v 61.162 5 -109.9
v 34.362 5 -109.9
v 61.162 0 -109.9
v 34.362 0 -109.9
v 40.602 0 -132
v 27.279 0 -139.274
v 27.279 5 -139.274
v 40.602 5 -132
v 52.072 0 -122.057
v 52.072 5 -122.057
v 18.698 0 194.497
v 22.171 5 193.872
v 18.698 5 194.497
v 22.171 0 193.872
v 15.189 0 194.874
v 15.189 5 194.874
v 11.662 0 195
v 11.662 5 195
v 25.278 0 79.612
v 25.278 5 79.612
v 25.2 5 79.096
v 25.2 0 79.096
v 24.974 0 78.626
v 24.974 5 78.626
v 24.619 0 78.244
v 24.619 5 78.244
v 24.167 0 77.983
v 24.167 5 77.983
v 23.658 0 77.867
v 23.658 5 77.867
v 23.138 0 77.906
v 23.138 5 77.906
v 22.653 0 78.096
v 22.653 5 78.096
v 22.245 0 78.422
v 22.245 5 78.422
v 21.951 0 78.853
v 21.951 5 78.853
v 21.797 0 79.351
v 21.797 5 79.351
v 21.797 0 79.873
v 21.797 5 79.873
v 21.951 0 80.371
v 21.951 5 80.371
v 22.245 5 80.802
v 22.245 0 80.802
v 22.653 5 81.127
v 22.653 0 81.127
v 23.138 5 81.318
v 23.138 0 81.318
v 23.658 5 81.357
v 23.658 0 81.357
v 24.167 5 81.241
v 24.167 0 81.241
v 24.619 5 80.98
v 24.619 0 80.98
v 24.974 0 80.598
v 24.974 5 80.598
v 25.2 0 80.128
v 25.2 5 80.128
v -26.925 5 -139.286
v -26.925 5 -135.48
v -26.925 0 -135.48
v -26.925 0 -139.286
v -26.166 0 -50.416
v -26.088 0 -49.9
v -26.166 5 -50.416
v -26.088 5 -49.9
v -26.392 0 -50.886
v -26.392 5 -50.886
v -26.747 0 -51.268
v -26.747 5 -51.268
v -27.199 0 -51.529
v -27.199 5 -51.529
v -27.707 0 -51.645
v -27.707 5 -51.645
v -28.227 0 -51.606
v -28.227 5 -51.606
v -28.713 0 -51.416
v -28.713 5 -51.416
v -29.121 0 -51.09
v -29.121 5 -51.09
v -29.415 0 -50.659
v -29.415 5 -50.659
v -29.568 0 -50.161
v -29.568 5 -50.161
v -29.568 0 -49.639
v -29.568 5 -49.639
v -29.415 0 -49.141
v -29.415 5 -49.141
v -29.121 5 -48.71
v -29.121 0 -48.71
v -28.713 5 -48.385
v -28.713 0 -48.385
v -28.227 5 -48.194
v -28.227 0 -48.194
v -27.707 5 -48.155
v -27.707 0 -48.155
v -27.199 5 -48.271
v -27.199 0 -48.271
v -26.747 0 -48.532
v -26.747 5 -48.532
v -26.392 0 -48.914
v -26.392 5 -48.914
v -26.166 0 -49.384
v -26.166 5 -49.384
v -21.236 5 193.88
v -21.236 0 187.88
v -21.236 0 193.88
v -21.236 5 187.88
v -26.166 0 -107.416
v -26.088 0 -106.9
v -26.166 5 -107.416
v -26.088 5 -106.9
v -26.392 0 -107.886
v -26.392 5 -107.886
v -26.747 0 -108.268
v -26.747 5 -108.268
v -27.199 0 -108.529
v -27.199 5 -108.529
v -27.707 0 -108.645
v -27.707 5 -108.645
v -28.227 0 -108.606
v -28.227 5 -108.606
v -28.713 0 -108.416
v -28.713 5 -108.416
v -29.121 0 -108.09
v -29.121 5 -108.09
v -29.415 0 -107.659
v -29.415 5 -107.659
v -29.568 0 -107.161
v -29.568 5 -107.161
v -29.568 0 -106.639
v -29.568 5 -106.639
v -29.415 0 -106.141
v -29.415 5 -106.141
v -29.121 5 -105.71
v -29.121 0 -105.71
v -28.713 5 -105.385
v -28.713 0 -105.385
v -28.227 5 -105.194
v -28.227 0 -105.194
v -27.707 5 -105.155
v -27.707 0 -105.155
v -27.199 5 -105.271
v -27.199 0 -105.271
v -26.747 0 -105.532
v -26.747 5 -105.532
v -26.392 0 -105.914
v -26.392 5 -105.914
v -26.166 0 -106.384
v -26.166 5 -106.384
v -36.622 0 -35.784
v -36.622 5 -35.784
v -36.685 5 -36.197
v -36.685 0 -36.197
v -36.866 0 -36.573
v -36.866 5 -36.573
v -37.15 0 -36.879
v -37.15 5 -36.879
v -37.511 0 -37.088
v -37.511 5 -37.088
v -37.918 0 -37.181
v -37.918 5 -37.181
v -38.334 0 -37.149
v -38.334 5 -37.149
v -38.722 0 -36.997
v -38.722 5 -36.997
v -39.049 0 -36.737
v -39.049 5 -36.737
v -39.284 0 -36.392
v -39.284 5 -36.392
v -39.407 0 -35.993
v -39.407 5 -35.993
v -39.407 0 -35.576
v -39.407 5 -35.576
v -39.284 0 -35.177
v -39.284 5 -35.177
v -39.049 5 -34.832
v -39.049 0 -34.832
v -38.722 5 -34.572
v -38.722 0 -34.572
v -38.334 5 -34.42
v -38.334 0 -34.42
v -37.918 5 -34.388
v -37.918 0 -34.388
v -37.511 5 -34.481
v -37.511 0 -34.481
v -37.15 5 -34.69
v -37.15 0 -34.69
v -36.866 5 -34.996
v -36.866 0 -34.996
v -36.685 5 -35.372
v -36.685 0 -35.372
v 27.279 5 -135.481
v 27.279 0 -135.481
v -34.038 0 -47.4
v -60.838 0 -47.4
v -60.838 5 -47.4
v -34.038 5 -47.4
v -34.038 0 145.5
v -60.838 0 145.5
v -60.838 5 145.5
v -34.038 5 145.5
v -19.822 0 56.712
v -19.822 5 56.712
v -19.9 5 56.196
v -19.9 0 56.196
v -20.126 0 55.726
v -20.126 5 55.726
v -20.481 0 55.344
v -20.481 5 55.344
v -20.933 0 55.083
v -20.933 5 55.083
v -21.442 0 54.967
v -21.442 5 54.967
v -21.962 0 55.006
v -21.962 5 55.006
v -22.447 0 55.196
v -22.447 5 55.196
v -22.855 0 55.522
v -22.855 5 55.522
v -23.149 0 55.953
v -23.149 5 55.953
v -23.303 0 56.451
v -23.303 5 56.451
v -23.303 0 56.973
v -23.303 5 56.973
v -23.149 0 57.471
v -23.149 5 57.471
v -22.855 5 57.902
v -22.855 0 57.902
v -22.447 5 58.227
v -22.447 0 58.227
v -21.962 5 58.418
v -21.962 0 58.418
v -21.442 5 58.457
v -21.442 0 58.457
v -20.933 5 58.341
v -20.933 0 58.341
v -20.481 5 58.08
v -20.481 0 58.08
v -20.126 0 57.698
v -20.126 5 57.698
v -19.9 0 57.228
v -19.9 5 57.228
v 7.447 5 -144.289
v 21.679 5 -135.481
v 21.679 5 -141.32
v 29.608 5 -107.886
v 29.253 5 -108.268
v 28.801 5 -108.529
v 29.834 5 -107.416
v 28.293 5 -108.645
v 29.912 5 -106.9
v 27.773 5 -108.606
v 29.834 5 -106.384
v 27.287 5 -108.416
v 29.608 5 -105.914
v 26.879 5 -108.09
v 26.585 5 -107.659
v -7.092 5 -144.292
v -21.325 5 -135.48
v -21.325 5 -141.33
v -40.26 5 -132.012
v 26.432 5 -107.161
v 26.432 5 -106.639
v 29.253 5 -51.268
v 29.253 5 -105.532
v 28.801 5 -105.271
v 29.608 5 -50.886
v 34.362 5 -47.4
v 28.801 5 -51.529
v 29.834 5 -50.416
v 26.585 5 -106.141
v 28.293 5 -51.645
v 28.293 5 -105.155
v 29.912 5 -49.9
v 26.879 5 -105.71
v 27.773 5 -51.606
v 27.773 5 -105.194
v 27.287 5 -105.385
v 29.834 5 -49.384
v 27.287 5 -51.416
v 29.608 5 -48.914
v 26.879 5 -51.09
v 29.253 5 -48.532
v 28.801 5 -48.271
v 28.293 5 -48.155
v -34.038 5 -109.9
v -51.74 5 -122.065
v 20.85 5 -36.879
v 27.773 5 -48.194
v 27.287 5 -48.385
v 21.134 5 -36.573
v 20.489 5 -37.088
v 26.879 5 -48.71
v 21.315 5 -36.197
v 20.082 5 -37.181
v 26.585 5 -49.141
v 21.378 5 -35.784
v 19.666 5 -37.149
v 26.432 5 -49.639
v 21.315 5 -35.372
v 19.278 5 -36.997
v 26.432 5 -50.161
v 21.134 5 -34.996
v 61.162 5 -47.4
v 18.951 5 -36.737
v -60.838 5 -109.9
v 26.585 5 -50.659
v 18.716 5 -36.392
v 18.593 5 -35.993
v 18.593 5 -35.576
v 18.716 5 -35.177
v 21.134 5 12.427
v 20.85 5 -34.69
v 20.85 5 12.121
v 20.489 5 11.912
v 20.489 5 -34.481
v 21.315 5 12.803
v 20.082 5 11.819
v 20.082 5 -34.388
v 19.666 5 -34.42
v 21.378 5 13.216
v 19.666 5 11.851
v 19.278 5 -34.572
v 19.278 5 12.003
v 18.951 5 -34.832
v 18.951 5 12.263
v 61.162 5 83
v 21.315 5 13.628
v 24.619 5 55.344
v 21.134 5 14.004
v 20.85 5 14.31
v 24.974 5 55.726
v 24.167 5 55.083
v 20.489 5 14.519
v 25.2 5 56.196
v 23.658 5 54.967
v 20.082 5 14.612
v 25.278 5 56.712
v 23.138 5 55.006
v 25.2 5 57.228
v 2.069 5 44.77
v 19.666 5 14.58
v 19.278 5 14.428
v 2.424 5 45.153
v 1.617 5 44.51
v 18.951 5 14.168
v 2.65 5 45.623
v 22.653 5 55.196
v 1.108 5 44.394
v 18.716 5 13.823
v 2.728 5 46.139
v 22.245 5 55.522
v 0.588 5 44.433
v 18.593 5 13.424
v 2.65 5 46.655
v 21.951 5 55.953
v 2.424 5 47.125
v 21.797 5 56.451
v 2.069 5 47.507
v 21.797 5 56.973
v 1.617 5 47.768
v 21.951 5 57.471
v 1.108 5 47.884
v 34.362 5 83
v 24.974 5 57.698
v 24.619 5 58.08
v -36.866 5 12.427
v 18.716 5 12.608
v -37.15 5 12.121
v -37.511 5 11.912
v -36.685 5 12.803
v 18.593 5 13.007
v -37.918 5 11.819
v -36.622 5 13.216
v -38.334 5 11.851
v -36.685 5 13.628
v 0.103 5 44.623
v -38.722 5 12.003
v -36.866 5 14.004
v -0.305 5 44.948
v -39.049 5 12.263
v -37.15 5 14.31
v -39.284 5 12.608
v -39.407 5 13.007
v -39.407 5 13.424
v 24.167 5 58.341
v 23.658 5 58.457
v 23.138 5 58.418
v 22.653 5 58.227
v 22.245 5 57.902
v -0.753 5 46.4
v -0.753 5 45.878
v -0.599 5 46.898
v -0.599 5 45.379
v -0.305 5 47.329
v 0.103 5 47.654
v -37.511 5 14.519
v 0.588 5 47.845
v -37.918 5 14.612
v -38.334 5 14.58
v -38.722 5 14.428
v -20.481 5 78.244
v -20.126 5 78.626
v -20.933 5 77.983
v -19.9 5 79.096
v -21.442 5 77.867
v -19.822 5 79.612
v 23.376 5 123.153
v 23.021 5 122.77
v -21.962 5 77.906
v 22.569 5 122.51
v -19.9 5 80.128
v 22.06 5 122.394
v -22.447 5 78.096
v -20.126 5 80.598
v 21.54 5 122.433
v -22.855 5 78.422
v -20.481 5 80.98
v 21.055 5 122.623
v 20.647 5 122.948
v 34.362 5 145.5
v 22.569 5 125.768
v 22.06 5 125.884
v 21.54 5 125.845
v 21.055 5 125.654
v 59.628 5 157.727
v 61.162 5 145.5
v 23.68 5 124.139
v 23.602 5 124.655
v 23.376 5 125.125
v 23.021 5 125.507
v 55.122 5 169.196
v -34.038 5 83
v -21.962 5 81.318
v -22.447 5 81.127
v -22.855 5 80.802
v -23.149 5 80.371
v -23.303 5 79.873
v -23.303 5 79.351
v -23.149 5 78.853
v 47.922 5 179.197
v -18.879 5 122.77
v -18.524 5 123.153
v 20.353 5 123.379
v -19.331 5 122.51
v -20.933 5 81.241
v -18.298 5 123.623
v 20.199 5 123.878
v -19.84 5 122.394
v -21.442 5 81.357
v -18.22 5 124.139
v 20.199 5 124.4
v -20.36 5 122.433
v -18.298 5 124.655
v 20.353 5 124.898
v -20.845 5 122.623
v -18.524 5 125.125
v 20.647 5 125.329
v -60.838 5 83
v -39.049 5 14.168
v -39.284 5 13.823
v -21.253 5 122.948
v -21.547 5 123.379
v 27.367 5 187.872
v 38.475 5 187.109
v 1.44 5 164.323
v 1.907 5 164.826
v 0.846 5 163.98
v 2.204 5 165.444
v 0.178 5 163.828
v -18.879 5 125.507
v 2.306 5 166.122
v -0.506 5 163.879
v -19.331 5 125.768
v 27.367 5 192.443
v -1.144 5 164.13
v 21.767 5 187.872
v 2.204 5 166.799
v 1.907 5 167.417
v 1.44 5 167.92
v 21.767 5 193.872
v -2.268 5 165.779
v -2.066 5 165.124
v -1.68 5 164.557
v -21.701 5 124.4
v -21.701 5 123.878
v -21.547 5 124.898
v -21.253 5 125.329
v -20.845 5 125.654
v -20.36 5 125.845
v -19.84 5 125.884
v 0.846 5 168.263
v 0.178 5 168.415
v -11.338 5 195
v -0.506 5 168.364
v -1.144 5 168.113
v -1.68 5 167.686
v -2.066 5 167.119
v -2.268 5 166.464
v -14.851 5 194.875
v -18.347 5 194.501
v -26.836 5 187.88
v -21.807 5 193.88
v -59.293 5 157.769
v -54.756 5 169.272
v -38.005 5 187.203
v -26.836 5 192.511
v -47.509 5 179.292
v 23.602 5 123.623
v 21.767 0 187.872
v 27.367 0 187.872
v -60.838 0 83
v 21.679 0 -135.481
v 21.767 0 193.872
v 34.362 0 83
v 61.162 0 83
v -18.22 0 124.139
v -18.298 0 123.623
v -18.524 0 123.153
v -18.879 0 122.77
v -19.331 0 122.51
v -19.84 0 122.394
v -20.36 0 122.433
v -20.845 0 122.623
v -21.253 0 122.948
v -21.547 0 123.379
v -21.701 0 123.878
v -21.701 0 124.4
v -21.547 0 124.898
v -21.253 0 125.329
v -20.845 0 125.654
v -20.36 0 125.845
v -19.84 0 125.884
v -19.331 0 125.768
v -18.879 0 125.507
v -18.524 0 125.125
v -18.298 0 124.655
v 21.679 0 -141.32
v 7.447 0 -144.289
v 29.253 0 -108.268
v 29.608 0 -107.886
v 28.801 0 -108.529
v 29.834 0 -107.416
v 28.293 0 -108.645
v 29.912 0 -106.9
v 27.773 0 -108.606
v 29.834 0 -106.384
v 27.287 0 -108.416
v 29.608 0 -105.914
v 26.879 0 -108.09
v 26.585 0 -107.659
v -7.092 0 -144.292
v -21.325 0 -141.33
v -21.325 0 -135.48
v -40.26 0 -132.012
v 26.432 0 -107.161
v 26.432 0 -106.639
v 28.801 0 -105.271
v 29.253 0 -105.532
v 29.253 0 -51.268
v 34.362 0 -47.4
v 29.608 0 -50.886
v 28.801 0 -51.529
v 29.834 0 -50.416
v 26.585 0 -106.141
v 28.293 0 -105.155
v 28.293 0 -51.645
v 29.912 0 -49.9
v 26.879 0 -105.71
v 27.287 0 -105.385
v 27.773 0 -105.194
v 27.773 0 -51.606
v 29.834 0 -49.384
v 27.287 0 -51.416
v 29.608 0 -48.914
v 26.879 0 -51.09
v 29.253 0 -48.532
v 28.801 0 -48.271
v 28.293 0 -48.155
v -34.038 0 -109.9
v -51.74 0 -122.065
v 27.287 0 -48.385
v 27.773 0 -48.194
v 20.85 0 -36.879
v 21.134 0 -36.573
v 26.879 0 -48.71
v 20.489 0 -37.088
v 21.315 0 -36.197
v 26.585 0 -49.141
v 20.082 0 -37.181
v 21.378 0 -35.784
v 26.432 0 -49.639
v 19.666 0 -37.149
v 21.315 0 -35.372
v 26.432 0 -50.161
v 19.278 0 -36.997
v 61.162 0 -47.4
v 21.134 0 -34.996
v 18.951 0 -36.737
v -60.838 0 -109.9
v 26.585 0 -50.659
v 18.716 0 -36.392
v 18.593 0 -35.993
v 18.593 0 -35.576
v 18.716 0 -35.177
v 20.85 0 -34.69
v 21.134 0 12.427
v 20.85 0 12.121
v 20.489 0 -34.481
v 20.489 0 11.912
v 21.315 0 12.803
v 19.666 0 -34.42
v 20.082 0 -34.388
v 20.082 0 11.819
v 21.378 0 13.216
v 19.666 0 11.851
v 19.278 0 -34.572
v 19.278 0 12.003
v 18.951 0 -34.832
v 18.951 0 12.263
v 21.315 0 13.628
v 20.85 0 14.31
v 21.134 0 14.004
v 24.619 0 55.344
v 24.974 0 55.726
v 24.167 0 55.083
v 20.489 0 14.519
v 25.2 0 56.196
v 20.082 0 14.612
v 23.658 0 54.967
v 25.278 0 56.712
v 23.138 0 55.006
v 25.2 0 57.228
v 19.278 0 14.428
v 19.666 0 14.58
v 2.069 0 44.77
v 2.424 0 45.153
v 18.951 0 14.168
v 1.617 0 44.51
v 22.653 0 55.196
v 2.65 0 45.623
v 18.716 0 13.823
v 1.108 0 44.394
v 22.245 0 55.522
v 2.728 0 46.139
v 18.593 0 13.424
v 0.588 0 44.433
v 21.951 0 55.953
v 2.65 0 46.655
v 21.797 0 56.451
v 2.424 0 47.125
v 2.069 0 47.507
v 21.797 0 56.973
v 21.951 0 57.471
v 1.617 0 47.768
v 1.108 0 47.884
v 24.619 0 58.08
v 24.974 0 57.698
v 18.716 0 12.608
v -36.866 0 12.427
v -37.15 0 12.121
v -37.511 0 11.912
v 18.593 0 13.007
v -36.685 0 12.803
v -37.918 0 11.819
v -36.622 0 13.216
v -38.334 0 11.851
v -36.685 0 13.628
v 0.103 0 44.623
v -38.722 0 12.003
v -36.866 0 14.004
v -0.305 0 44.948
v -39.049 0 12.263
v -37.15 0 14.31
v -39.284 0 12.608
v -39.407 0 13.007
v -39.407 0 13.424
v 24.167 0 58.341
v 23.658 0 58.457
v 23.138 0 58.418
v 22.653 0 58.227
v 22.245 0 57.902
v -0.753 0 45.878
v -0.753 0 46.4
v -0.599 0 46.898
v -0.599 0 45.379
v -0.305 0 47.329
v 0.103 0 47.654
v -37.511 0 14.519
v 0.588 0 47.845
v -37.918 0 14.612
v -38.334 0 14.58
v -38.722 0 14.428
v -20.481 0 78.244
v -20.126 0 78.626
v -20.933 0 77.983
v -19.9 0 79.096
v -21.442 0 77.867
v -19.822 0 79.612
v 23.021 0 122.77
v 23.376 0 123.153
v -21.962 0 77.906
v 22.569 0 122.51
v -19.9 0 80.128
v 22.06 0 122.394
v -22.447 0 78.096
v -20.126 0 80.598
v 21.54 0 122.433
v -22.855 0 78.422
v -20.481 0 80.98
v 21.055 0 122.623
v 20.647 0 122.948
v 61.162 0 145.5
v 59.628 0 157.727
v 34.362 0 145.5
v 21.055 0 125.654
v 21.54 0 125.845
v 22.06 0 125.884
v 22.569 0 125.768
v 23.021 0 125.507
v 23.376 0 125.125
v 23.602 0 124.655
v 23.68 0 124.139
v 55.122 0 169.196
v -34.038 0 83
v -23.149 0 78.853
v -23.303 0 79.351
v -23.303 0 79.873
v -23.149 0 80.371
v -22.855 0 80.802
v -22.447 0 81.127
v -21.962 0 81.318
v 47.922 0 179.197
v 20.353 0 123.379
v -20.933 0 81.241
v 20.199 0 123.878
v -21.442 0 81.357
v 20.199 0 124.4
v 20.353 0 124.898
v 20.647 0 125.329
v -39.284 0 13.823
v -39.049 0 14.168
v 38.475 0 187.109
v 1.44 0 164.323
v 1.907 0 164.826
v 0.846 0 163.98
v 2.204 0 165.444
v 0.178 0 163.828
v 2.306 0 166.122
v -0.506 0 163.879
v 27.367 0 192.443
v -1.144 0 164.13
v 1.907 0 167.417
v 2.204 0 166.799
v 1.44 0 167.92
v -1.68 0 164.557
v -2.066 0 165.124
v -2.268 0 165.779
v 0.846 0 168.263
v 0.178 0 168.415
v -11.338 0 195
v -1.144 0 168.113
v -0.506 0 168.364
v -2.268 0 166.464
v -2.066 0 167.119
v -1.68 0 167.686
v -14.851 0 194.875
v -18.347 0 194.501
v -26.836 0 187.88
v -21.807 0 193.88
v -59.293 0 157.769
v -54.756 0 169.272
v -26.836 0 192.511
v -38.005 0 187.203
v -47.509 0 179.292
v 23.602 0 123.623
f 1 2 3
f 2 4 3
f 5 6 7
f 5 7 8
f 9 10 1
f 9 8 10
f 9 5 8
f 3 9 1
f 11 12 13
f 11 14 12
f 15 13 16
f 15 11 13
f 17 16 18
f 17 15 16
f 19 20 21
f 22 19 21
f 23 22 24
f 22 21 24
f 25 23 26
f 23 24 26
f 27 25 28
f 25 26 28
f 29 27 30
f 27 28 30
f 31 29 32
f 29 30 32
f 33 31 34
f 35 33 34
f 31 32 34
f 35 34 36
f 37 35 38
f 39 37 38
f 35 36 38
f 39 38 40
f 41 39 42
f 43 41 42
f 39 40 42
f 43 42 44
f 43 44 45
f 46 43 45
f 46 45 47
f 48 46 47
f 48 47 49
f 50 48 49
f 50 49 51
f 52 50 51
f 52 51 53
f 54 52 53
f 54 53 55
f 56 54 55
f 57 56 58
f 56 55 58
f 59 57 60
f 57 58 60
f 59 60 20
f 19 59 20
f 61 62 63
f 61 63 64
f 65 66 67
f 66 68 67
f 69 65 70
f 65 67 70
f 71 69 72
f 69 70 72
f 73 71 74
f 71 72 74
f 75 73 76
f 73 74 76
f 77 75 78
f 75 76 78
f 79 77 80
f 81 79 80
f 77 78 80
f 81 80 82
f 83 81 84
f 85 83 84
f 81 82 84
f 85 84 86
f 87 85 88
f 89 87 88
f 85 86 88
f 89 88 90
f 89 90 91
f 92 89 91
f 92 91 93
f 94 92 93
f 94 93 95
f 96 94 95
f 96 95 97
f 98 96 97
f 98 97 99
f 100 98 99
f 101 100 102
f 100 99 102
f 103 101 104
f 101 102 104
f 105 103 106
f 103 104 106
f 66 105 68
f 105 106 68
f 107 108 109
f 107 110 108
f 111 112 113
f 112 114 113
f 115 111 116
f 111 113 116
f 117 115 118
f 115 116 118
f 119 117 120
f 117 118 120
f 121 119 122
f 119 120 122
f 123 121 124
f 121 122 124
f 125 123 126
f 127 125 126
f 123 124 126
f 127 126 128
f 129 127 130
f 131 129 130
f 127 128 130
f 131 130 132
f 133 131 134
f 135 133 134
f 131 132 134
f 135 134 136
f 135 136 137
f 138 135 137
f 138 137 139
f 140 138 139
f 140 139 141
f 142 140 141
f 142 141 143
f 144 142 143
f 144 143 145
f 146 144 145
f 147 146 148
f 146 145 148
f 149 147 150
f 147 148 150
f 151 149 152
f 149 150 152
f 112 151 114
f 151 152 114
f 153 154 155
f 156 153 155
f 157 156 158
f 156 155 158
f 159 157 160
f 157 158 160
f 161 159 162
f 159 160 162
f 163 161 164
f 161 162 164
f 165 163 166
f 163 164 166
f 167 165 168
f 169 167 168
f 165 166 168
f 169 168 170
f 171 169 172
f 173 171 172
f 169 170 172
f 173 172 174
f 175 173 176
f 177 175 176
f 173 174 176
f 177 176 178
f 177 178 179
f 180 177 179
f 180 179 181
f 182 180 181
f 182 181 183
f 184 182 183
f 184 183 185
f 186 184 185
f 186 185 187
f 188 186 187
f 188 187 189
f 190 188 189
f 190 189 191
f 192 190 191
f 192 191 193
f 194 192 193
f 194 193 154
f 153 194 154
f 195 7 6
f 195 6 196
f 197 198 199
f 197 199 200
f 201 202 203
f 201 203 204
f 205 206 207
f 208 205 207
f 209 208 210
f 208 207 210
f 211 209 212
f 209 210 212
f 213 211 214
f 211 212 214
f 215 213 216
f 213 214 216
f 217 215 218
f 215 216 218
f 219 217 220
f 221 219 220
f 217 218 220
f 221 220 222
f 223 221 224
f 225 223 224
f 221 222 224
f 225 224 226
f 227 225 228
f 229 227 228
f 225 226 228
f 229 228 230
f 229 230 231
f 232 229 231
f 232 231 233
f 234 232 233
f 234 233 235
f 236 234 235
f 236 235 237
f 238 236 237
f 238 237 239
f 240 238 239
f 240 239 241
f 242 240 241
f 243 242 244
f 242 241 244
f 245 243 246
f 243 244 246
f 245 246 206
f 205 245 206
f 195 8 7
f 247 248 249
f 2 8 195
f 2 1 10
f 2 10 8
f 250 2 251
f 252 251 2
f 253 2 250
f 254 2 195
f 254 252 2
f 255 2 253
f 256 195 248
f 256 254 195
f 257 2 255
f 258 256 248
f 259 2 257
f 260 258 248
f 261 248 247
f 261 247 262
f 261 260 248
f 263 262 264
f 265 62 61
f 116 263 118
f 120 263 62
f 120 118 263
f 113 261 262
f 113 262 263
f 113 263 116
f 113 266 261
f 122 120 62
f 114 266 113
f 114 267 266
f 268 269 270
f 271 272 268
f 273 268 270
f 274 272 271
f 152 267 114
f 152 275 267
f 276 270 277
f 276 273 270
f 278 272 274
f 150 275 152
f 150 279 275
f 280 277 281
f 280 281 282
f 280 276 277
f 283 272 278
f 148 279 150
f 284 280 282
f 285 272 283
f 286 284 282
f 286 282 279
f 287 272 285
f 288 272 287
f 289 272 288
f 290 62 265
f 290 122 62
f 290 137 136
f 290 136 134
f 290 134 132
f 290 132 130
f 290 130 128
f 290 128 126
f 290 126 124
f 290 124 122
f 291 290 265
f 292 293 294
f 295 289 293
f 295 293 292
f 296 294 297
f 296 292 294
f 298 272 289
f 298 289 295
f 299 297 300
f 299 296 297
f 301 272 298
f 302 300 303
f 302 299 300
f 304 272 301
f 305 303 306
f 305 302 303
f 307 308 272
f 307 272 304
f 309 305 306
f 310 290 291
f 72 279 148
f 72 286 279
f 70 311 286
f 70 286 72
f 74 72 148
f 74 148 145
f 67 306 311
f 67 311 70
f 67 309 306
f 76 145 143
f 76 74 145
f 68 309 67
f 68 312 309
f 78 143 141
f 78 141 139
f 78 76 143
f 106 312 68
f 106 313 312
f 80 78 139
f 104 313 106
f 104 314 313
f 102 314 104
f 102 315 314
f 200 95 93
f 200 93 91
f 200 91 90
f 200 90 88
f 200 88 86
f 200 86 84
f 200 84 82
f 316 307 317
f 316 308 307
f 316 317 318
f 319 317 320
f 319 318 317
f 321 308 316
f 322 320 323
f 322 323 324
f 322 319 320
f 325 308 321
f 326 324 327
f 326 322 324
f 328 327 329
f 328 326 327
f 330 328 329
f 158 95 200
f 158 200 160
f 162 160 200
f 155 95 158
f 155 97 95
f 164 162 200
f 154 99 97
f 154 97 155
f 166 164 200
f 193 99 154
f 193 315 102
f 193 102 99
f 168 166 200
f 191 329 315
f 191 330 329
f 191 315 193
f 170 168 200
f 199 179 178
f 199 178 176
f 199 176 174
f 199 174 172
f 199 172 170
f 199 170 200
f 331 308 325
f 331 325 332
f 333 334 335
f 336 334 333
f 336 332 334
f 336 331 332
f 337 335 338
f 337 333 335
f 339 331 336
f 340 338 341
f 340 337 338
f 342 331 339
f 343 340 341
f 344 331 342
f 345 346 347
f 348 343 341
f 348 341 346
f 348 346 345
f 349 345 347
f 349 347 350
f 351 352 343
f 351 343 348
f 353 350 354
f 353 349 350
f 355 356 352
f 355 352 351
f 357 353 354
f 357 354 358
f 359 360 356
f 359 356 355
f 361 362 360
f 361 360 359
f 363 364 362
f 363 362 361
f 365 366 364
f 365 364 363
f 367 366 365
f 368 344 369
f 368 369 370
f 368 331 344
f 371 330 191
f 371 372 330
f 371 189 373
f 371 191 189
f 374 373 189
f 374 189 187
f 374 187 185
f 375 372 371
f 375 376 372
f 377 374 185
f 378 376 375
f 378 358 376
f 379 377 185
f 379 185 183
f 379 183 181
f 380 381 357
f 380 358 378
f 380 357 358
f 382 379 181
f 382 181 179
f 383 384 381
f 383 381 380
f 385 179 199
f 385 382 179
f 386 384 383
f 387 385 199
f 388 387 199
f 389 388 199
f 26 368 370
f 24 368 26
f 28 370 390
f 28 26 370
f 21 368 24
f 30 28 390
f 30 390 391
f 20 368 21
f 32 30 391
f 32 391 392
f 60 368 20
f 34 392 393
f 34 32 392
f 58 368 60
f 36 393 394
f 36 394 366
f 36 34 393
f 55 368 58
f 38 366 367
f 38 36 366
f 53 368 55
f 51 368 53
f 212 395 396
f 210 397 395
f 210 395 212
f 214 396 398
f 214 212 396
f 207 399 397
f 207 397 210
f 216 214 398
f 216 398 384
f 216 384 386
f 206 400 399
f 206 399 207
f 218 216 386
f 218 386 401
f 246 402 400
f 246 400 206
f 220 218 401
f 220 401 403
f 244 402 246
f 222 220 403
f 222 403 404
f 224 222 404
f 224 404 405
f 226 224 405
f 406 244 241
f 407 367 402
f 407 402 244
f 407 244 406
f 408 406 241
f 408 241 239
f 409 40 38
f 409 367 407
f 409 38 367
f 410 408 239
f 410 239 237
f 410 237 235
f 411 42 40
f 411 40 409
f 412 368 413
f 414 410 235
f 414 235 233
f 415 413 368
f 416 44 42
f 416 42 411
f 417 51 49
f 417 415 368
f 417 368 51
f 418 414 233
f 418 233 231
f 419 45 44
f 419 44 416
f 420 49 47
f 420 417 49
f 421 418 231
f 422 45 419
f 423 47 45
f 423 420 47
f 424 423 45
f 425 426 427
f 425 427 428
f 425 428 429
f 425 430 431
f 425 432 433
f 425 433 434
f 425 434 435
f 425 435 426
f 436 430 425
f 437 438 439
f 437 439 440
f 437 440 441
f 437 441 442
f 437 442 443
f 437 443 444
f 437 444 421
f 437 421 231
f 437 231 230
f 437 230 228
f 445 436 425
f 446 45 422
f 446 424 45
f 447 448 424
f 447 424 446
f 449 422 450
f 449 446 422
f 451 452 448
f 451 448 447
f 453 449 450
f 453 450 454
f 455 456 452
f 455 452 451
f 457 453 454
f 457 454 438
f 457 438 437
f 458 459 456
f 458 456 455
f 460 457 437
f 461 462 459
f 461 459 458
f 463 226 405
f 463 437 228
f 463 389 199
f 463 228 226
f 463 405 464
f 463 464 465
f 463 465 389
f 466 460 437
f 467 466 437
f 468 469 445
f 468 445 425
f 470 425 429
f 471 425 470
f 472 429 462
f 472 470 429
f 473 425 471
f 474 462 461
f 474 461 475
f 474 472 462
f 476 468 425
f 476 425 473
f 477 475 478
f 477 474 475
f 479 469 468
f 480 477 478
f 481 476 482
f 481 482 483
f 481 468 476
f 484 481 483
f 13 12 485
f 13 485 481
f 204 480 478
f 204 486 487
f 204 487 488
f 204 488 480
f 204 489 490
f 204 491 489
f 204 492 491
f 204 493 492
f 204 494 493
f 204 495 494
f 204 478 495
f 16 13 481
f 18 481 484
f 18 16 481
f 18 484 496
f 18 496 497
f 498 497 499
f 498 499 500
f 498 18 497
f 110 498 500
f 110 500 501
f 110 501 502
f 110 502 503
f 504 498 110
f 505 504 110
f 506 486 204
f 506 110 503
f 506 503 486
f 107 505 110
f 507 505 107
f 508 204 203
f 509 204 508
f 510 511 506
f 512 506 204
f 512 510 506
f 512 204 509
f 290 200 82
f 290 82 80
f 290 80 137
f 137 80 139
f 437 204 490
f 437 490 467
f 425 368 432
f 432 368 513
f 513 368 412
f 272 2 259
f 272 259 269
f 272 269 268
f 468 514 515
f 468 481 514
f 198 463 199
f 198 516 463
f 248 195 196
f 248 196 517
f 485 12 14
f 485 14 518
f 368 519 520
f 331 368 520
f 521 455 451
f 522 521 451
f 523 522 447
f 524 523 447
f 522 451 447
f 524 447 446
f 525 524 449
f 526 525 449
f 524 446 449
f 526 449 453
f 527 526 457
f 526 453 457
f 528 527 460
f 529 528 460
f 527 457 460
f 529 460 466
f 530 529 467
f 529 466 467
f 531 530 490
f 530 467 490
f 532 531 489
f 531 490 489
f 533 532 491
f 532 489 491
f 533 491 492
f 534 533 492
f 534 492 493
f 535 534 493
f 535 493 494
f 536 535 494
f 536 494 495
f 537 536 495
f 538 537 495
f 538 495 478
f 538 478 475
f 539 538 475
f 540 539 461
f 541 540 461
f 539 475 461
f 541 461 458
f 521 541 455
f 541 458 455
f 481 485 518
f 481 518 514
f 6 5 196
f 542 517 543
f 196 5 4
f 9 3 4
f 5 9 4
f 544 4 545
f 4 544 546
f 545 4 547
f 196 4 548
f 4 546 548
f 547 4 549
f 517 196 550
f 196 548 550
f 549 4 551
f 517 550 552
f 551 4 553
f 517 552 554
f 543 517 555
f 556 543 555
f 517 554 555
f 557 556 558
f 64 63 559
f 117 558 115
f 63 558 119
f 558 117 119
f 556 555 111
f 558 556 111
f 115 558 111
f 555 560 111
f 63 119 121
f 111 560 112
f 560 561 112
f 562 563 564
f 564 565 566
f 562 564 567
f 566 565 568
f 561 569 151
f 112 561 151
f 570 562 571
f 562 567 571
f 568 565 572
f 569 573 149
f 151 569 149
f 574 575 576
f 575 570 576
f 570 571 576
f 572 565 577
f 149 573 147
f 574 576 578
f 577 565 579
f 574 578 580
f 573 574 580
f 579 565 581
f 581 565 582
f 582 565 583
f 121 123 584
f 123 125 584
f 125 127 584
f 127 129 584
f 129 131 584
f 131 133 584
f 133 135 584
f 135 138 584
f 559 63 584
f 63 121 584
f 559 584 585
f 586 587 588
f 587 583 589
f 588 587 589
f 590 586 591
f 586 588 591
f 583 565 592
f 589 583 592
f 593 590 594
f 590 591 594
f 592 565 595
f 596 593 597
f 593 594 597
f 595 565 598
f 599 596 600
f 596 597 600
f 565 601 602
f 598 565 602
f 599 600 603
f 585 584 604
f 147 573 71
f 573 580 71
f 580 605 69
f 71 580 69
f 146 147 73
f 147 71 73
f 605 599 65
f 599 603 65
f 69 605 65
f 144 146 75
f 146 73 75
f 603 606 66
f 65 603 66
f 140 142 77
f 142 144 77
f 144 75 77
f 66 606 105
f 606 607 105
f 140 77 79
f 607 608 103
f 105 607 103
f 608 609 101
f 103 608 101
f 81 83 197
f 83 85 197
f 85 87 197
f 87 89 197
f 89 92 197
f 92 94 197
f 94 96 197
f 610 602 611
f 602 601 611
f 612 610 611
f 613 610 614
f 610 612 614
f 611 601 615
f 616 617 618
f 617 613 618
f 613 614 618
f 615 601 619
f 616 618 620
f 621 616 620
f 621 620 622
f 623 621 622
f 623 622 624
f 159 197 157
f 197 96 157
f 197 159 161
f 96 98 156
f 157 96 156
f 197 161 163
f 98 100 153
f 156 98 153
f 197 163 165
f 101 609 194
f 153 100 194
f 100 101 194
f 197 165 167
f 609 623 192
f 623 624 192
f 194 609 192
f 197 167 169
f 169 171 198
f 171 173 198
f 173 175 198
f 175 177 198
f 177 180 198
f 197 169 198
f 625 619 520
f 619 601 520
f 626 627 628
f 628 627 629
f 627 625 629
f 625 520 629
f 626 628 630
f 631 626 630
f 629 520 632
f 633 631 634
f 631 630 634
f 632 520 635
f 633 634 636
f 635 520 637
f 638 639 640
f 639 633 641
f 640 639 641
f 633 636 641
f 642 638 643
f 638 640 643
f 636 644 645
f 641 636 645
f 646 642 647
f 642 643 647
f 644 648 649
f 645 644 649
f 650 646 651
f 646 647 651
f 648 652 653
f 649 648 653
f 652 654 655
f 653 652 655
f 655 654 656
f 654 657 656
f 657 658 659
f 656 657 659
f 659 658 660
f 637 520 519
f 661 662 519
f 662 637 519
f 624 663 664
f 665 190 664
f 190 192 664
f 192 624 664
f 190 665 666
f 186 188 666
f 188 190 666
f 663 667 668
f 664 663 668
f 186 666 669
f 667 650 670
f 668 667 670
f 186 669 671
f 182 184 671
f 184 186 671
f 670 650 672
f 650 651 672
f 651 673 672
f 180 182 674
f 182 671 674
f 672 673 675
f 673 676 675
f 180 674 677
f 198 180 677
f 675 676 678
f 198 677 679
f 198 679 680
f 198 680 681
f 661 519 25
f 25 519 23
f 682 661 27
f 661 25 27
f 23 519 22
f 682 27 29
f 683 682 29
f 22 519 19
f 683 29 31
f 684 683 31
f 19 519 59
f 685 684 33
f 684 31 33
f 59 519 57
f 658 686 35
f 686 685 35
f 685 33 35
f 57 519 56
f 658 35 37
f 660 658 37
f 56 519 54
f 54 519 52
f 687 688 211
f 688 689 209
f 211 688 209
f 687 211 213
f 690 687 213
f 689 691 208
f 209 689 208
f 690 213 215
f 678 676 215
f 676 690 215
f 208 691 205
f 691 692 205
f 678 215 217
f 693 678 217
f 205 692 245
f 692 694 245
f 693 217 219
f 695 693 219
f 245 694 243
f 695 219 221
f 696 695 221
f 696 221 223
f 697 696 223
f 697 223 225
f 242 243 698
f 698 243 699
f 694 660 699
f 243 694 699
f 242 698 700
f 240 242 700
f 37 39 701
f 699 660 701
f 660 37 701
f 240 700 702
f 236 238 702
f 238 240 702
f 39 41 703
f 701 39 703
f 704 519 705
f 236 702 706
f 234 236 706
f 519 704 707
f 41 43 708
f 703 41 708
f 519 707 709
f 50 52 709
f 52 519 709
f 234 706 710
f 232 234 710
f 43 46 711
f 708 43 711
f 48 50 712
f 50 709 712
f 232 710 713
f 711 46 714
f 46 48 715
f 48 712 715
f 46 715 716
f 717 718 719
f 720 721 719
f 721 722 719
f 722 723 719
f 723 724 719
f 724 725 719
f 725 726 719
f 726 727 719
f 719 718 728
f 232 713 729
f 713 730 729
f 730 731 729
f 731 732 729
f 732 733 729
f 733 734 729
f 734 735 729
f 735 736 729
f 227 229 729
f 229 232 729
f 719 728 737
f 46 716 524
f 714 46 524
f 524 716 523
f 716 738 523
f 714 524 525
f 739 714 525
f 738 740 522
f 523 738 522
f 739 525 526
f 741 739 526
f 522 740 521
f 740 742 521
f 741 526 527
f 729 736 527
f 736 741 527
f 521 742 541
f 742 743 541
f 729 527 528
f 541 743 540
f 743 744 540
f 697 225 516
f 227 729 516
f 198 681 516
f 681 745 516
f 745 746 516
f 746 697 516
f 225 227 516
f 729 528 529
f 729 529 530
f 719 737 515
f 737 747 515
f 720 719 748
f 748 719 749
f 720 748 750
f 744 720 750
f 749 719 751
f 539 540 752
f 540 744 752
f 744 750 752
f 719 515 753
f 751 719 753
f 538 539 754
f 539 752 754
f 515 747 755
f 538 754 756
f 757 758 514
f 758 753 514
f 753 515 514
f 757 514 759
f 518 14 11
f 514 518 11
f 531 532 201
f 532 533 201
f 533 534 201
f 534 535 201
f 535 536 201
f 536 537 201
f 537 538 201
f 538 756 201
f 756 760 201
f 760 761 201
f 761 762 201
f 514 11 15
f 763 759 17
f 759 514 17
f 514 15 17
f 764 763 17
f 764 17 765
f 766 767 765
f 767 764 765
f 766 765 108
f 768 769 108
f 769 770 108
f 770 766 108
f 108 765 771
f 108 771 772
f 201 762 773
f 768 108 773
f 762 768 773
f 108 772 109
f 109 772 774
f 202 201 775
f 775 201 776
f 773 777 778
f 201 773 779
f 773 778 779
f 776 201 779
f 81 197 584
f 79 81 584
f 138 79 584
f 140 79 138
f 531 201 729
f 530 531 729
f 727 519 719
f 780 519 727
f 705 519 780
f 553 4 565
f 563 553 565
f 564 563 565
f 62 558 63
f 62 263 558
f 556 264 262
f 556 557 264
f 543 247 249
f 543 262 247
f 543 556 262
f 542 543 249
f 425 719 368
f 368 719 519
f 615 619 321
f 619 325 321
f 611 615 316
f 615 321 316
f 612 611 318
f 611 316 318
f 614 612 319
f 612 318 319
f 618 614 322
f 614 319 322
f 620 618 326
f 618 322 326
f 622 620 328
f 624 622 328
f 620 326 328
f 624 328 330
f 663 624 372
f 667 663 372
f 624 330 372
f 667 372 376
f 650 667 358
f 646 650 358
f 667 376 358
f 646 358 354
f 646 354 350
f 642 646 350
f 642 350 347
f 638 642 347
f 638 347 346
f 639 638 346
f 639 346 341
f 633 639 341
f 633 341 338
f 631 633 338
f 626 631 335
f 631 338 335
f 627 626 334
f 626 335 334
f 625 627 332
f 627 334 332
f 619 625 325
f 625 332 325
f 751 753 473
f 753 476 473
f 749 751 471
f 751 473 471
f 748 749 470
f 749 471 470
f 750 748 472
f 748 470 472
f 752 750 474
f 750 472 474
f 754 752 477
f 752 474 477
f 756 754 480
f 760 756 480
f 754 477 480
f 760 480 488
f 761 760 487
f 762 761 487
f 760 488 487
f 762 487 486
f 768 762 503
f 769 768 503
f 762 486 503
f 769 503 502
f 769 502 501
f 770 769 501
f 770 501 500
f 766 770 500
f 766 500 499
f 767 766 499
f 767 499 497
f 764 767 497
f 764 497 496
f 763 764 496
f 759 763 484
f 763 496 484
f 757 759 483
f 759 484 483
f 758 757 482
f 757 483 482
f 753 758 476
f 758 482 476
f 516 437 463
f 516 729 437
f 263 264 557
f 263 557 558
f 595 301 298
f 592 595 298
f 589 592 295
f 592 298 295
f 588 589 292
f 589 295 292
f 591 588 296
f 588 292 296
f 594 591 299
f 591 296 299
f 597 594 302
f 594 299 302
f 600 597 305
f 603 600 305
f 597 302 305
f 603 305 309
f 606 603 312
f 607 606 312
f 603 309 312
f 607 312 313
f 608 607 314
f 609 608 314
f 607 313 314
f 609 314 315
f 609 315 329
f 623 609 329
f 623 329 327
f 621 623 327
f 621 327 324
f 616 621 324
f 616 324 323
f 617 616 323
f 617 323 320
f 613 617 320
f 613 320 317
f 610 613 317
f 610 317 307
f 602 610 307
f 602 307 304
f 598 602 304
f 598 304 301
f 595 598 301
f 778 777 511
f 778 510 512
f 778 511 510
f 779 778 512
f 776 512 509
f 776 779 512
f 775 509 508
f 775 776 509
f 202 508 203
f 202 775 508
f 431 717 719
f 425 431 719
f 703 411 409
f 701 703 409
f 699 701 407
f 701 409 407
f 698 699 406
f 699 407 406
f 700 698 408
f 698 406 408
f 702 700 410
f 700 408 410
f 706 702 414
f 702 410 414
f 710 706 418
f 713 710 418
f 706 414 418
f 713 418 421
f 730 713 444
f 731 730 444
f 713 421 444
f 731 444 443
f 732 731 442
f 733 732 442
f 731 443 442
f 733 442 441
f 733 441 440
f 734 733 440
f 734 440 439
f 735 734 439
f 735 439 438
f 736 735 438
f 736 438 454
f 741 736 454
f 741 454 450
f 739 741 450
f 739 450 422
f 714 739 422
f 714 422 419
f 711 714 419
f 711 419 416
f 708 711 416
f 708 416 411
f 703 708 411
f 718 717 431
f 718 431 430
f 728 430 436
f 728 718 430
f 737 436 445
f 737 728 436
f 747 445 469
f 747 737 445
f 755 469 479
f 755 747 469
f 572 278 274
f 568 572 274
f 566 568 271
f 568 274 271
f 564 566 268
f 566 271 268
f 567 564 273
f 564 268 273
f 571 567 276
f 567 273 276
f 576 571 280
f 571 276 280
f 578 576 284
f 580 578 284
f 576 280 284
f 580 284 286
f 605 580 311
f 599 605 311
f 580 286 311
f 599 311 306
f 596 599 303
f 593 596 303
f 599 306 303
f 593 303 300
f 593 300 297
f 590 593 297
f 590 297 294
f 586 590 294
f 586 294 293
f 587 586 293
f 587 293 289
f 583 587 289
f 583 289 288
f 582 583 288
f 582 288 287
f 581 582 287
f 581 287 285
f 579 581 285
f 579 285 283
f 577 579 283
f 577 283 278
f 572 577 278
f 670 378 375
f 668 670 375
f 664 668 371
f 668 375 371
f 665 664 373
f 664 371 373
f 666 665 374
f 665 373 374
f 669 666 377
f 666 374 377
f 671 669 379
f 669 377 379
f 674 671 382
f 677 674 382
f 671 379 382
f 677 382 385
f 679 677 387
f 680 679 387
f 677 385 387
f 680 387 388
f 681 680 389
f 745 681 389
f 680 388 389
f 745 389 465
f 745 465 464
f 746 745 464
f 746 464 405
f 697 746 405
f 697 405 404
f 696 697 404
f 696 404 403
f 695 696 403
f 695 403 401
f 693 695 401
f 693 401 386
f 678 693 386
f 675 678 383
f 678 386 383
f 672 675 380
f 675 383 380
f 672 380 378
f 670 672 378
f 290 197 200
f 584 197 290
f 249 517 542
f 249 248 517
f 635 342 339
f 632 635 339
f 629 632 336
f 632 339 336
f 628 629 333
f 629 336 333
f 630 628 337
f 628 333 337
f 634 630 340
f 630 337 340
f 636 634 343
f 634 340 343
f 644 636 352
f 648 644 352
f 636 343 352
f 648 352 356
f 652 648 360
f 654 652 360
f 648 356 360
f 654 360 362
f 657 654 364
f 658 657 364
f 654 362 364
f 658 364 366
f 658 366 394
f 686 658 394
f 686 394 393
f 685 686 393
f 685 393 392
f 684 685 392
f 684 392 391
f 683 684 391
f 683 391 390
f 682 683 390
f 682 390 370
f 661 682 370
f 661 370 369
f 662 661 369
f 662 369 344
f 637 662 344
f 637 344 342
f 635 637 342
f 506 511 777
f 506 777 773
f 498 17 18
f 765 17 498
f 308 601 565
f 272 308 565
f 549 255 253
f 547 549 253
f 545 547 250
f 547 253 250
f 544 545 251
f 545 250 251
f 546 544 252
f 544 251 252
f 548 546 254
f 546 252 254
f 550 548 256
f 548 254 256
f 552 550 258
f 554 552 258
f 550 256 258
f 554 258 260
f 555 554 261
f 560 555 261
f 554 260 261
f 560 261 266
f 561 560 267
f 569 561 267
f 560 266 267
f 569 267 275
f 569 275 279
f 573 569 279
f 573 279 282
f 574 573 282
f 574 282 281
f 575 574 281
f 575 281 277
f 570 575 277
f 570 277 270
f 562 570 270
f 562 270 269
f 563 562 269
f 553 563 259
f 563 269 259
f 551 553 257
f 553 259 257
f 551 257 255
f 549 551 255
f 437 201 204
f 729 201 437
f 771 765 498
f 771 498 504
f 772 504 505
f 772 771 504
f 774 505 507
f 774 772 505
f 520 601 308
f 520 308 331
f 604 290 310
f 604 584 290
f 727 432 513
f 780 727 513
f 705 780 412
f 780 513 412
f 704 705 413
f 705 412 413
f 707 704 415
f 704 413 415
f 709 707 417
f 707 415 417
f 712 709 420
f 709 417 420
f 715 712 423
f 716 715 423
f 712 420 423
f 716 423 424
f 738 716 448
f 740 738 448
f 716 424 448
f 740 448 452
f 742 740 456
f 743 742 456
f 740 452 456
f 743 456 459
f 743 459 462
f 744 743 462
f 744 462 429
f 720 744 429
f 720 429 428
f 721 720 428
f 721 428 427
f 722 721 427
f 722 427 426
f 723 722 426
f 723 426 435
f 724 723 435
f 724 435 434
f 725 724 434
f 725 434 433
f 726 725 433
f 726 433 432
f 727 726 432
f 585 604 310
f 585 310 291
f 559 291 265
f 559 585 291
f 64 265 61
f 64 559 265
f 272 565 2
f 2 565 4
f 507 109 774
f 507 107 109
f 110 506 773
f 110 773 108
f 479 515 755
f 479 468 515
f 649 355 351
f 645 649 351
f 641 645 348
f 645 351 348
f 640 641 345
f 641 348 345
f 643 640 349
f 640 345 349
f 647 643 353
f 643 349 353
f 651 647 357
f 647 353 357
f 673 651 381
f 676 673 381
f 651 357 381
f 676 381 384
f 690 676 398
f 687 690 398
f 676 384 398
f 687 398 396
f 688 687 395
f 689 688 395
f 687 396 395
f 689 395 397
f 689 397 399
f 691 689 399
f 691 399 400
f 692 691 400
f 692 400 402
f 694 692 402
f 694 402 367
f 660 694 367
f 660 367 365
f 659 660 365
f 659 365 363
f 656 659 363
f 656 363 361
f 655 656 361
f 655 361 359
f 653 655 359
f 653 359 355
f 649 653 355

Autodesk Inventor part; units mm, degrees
ref_plane "YZ Plane" through (0, 0, 0) normal (1, 0, 0) x (0, 1, 0)
ref_plane "XZ Plane" through (0, 0, 0) normal (0, 1, 0) x (-1, 0, 0)
ref_plane "XY Plane" through (0, 0, 0) normal (0, 0, 1) x (1, 0, 0)
sketch "Sketch1" plane through (0, 0, 0) normal (0, 1, 0) x (-1, 0, 0)
  line L0 (-11.6621, 194.9999) -> (11.3379, 194.9999)
  line L1 (60.8379, 145.4999) -> (60.8379, -109.9001)
  line L2 (-61.1621, -109.9001) -> (-61.1621, 145.4999)
  line L3 (-61.1621, 194.9999) -> (61.1621, -194.9999) construction
  line L4 (60.8379, 194.9999) -> (-60.8379, -194.9999) construction
  arc A0 (60.8379, 145.4999) -> (11.3379, 194.9999) centre (11.3379, 145.4999) ccw
  arc A1 (-11.6621, 194.9999) -> (-61.1621, 145.4999) centre (-11.6621, 145.4999) ccw
  line L5 (-61.1621, 145.4999) -> (-34.3621, 145.4999)
  line L6 (-34.3621, 145.4999) -> (-34.3621, 82.9999)
  line L7 (-34.3621, 82.9999) -> (-61.1621, 82.9999)
  line L8 (-61.1621, 82.9999) -> (-61.1621, 145.4999)
  line L9 (-61.1621, 82.9999) -> (-61.1621, -47.4001)
  line L10 (-61.1621, -47.4001) -> (-34.3621, -47.4001)
  line L11 (-34.3621, -47.4001) -> (-34.3621, -109.9001)
  line L12 (-34.3621, -109.9001) -> (-61.1621, -109.9001)
  line L13 (-61.1621, -109.9001) -> (-61.1621, -47.4001)
  line L14 (60.8379, 145.4999) -> (34.0379, 145.4999)
  line L15 (34.0379, 145.4999) -> (34.0379, 82.9999)
  line L16 (34.0379, 82.9999) -> (60.8379, 82.9999)
  line L17 (60.8379, 82.9999) -> (60.8379, 145.4999)
  line L18 (60.8379, -47.4001) -> (34.0379, -47.4001)
  line L19 (34.0379, -47.4001) -> (34.0379, -109.9001)
  line L20 (34.0379, -109.9001) -> (60.8379, -109.9001)
  line L21 (60.8379, -109.9001) -> (60.8379, -47.4001)
  arc A2 (-61.1621, -109.9001) -> (60.8379, -109.9001) centre (-0.1621, -73.7641) ccw
  point P0 (0, 0)
  dimension "d0" = 122
  dimension "d1" = 390
  dimension "d2" = 49.5
  dimension "d4" = 26.8
  dimension "d5" = 62.5
  dimension "d6" = 130.4
  dimension "d7" = 26.8
  dimension "d8" = 62.5
  dimension "d9" = 26.8
  dimension "d10" = 62.5
  dimension "d11" = 26.8
  dimension "d12" = 62.5
  dimension "d13" = 70.9
extrude "Extrusion1" add sketch "Sketch1" along normal blind 5 contours L0 A0 L14 L15 L16 L1 L18 L19 L20 A2 L12 L11 L10 L2 L7 L6 L5 A1
sketch "Boceto2" plane through (0, 5, 0) normal (0, 1, 0) x (1, 0, 0)
  point P0 (0, 0)
sketch "Boceto3" plane through (0, 5, 0) normal (0, 1, 0) x (1, 0, 0)
  line L0 (-11.3379, -194.9999) -> (11.6621, -194.9999) projected
  line L1 (0.1621, -194.9999) -> (0.1621, -184.9999)
  line L2 (-2.7008, -183.6215) -> (19.0062, -183.6215)
  line L3 (19.0062, -183.6215) -> (-18.9938, -183.6215)
  line L4 (-2.7008, -148.6215) -> (19.0062, -148.6215)
  line L5 (19.0062, -148.6215) -> (-18.9938, -148.6215)
  line L6 (-18.9938, -148.6215) -> (-18.9938, -183.6215)
  line L7 (19.0062, -148.6215) -> (19.0062, -183.6215)
  line L8 (61.1621, -82.9999) -> (61.1621, 47.4001) projected
  line L9 (-60.8379, 47.4001) -> (-60.8379, -82.9999) projected
  line L10 (21.7666, -187.8715) -> (27.3666, -187.8715)
  line L11 (27.3666, -187.8715) -> (27.3666, -193.8715)
  line L12 (27.3666, -193.8715) -> (21.7666, -193.8715)
  line L13 (21.7666, -193.8715) -> (21.7666, -187.8715)
  line L14 (-11.3379, -194.9999) -> (-14.1379, -194.9999)
  arc A0 (-60.8379, -145.4999) -> (-11.3379, -194.9999) centre (-11.3379, -145.4999) ccw projected
  line L15 (-26.8363, -187.8801) -> (-21.2363, -187.8801)
  line L16 (-21.2363, -187.8801) -> (-21.2363, -193.8801)
  line L17 (-21.2363, -193.8801) -> (-26.8363, -193.8801)
  line L18 (-26.8363, -193.8801) -> (-26.8363, -187.8801)
  line L19 (21.7169, 135.4811) -> (27.3169, 135.4811)
  arc A1 (61.1621, 109.9001) -> (-60.8379, 109.9001) centre (0.1621, 73.7641) ccw projected
  line L20 (21.6786, 141.4811) -> (27.2786, 141.4811)
  line L21 (27.2786, 141.4811) -> (27.2786, 135.4811)
  line L22 (27.2786, 135.4811) -> (21.6786, 135.4811)
  line L23 (21.6786, 135.4811) -> (21.6786, 141.4811)
  line L24 (-26.9249, 141.4803) -> (-21.3249, 141.4803)
  line L25 (-21.3249, 141.4803) -> (-21.3249, 135.4803)
  line L26 (-21.3249, 135.4803) -> (-26.9249, 135.4803)
  line L27 (-26.9249, 135.4803) -> (-26.9249, 141.4803)
  line L28 (0.404, 144.7464) -> (0.404, -197.1126)
  line L29 (-34.0379, 47.4001) -> (-60.8379, 47.4001) projected
  line L30 (-60.8379, 47.4001) -> (-50.8379, 47.4001)
  line L31 (-41.5224, -16.7155) -> (-41.5224, 39.2845)
  line L32 (-41.5224, 39.2845) -> (43.4776, 39.2845)
  line L33 (43.4776, 39.2845) -> (43.4776, -16.7155)
  line L34 (43.4776, -16.7155) -> (-41.5224, -16.7155)
  line L35 (0.544, 11.7839) -> (0.544, 15.8925)
  line L36 (0.9776, 39.2845) -> (0.9776, -16.7155)
  line L37 (-21.3249, 141.4803) -> (21.6751, 141.4803)
  arc A2 (-60.8379, -145.4999) -> (-11.3379, -194.9999) centre (-11.3379, -145.4999) ccw projected
  line L38 (-34.0379, -82.9999) -> (-34.0379, -145.4999) projected
  line L39 (-21.2334, -193.8715) -> (-21.2169, -197.8147)
  line L40 (21.1268, -127.3043) -> (21.1268, -110.8043)
  line L41 (21.9297, -127.1387) -> (21.9297, -124.1387)
  line L42 (21.9297, -124.1387) -> (-19.9703, -124.1387)
  circle A3 centre (21.9297, -124.1387) radius 1.75
  circle A4 centre (-19.9703, -124.1387) radius 1.75
  line L43 (0.9797, -124.1387) -> (0.9776, -46.1387)
  circle A5 centre (0.9776, -46.1387) radius 1.75
  line L44 (3.2596, -48.0861) -> (0.432, -49.0887)
  line L45 (0.432, -49.0887) -> (-1.8499, -47.1412)
  line L46 (-1.8499, -47.1412) -> (-1.3044, -44.1913)
  line L47 (-1.3044, -44.1913) -> (1.5231, -43.1887)
  line L48 (1.5231, -43.1887) -> (3.8051, -45.1361)
  line L49 (3.8051, -45.1361) -> (3.2596, -48.0861)
  line L50 (0.9777, -49.2626) -> (28.4777, -49.2619)
  line L51 (28.4777, -49.2619) -> (-26.5223, -49.2619)
  line L52 (-26.5223, -49.2619) -> (-26.5223, -87.0619)
  line L53 (-26.5223, -87.0619) -> (28.4777, -87.0619)
  line L54 (28.4777, -87.0619) -> (28.4777, -49.2619)
  line L55 (-26.5223, -49.2619) -> (-23.3223, -49.2619)
  line L56 (-23.3223, -49.2619) -> (-23.3223, -54.9619)
  line L57 (-23.3223, -54.9619) -> (-21.5723, -54.9619)
  line L58 (-21.5723, -54.9619) -> (-21.5723, -56.7119)
  circle A6 centre (-21.5723, -56.7119) radius 1.75
  line L59 (-21.5723, -56.7119) -> (28.4777, -56.7119)
  line L60 (-21.5723, -56.7119) -> (-21.5723, -87.0619)
  line L61 (28.4777, -87.0619) -> (23.5277, -87.0619)
  line L62 (23.5277, -87.0619) -> (23.5277, -79.6119)
  circle A7 centre (23.5277, -79.6119) radius 1.75
  line L63 (23.5277, -79.6119) -> (-26.5223, -79.6119)
  line L64 (23.5277, -79.6119) -> (23.5277, -49.2619)
  circle A8 centre (23.5277, -56.7119) radius 1.75
  circle A9 centre (-21.5723, -79.6119) radius 1.75
  line L65 (-18.9938, -183.6215) -> (0.0062, -183.6215)
  line L66 (0.0062, -183.6215) -> (0.0062, -148.6215)
  line L67 (-21.2334, -193.8715) -> (21.7666, -193.8715)
  circle A10 centre (0.0062, -166.1215) radius 2.3
  line L68 (-41.5224, 39.2845) -> (-38.0224, 39.2845)
  line L69 (-38.0224, 39.2845) -> (-38.0224, 35.7845)
  line L70 (-38.0224, 35.7845) -> (19.9776, 35.7845)
  line L71 (19.9776, 35.7845) -> (19.9776, -13.2155)
  line L72 (19.9776, -13.2155) -> (-38.0224, -13.2155)
  line L73 (-38.0224, -13.2155) -> (-38.0224, 35.7845)
  circle A11 centre (-38.0224, 35.7845) radius 1.4
  circle A12 centre (19.9776, 35.7845) radius 1.4
  circle A13 centre (19.9776, -13.2155) radius 1.4
  circle A14 centre (-38.0224, -13.2155) radius 1.4
  line L74 (-34.0379, 109.9001) -> (-31.8379, 109.9001)
  line L75 (34.3621, 47.4001) -> (34.3621, 109.9001) projected
  line L76 (34.3621, 109.9001) -> (32.1621, 109.9001)
  line L77 (-31.8379, 109.9001) -> (32.1621, 109.9001)
  line L78 (32.1621, 109.9001) -> (32.1621, 47.4001)
  line L79 (32.1621, 47.4001) -> (-31.8379, 47.4001)
  line L80 (-31.8379, 47.4001) -> (-31.8379, 109.9001)
  line L81 (-31.8379, 109.9001) -> (-27.8379, 109.9001)
  line L82 (-27.8379, 109.9001) -> (-27.8379, 106.9001)
  line L83 (-27.8379, 106.9001) -> (28.1621, 106.9001)
  line L84 (28.1621, 106.9001) -> (28.1621, 49.9001)
  line L85 (28.1621, 49.9001) -> (-27.8379, 49.9001)
  line L86 (-27.8379, 49.9001) -> (-27.8379, 106.9001)
  circle A15 centre (-27.8379, 106.9001) radius 1.75
  circle A16 centre (28.1621, 106.9001) radius 1.75
  circle A17 centre (-27.8379, 49.9001) radius 1.75
  circle A18 centre (28.1621, 49.9001) radius 1.75
  point P0 (-21.5954, -147.627)
  point P1 (-17.4759, -197.9035)
  point P2 (-17.3346, -191.9653)
  point P3 (21.8949, -190.8298)
  point P4 (-20.3189, 140.8602)
  point P5 (0.404, -148.6215)
  point P6 (21.7169, 135.4811)
  point P7 (27.2786, 135.4811)
  point P8 (-26.8363, -192.5111)
  point P9 (-21.2363, -194.0001)
  point P10 (0.404, -148.6215)
  point P11 (-21.8071, -193.8801)
  point P12 (0.404, -183.6215)
  dimension "d16" = 10
  dimension "d18" = 38
  dimension "d19" = 35
  dimension "d21" = 38
  dimension "d29" = 5.6
  dimension "d30" = 6
  dimension "d36" = 5.6
  dimension "d44" = 5.6
  dimension "d45" = 6
  dimension "d46" = 5.6
  dimension "d47" = 6
  dimension "d69" = 56
  dimension "d70" = 85
  dimension "d128" = 16.5
  dimension "d133" = 3
  dimension "d134" = 3.5
  dimension "d135" = 3.5
  dimension "d136" = 78
  dimension "d137" = 41.9
  dimension "d138" = 3.5
  dimension "d139" = 3
  dimension "d140" = 27.5
  dimension "d141" = 55
  dimension "d142" = 37.8
  dimension "d143" = 3.2
  dimension "d144" = 5.7
  dimension "d146" = 1.75
  dimension "d147" = 1.75
  dimension "d148" = 3.5
  dimension "d149" = 4.95
  dimension "d150" = 7.45
  dimension "d151" = 3.5
  dimension "d152" = 3.5
  dimension "d153" = 3.5
  dimension "d156" = 19
  dimension "d157" = 35
  dimension "d158" = 90
  dimension "d159" = 43
  dimension "d160" = 43
  dimension "d161" = 4.6
  dimension "d164" = 3.5
  dimension "d165" = 3.5
  dimension "d166" = 58
  dimension "d167" = 49
  dimension "d168" = 58
  dimension "d169" = 90
  dimension "d170" = 2.8
  dimension "d171" = 2.8
  dimension "d172" = 2.8
  dimension "d173" = 2.8
  dimension "d174" = 2.2
  dimension "d175" = 2.2
  dimension "d176" = 62.5
  dimension "d177" = 64
  dimension "d178" = 4
  dimension "d179" = 3
  dimension "d180" = 56
  dimension "d181" = 57
  dimension "d182" = 3.5
  dimension "d183" = 3.5
  dimension "d184" = 3.5
  dimension "d185" = 3.5
extrude "Extrusión2" add sketch "Boceto3" against normal blind 1 contours L2 L66 A10 L28 | L28 A10 L4 L7 L2 | L2 L3 L6 L5 L4 L66 A10 | A10 L66 L28 | L28 A10 | A10 L66 | A10 L66 L4 L28
extrude "Extrusión4" cut sketch "Boceto3" against normal blind 20 contours L17 L18 A0 | A0 L18 L15 L16 L17 | L23 L20 L21 A1 | A1 L21 L19 L22 L23 | L13 L10 L11 L12 | L25 L26 L27 A1 | A1 L27 L24 L25
extrude "Extrusión6" cut sketch "Boceto3" against normal blind 10 contours A14 L73 L72 | L72 L73 A14 | A11 L73 L70 | L70 L69 A11 | A13 L71 L72 | L72 L71 A13 | L73 A11 L69 | A12 L71 L70 | L70 L71 A12
extrude "Extrusión7" cut sketch "Boceto3" against normal blind 5 contours A4 | A3 L40 L42 | L42 L40 A3 | A9 L60 L63 | L63 L60 A9 | A9 L63 L60 | L42 L41 A3 L40 | L40 A3 L41 L42 | L59 L58 A6 | A6 L60 L59 | L63 L62 A7 | A7 L64 L63 | L63 A9 L60 | L62 L64 A7 | L58 L60 A6 | A8 L64 L59 | L59 L64 A8 | A5 L28 | L28 A5 | L64 A8 L59 | L59 A8 L64
extrude "Extrusión8" cut sketch "Boceto3" against normal blind 5 contours A10 L66 L28 | L28 A10 | A10 L66
extrude "Extrusión9" cut sketch "Boceto3" against normal blind 10 contours A18 L84 L85 | L85 L84 A18 | A17 L86 L85 | L85 L86 A17 | A15 L86 L83 | L83 L82 A15 | A16 L84 L83 | L83 L84 A16 | L86 A15 L82
properties part number "base automodel"
